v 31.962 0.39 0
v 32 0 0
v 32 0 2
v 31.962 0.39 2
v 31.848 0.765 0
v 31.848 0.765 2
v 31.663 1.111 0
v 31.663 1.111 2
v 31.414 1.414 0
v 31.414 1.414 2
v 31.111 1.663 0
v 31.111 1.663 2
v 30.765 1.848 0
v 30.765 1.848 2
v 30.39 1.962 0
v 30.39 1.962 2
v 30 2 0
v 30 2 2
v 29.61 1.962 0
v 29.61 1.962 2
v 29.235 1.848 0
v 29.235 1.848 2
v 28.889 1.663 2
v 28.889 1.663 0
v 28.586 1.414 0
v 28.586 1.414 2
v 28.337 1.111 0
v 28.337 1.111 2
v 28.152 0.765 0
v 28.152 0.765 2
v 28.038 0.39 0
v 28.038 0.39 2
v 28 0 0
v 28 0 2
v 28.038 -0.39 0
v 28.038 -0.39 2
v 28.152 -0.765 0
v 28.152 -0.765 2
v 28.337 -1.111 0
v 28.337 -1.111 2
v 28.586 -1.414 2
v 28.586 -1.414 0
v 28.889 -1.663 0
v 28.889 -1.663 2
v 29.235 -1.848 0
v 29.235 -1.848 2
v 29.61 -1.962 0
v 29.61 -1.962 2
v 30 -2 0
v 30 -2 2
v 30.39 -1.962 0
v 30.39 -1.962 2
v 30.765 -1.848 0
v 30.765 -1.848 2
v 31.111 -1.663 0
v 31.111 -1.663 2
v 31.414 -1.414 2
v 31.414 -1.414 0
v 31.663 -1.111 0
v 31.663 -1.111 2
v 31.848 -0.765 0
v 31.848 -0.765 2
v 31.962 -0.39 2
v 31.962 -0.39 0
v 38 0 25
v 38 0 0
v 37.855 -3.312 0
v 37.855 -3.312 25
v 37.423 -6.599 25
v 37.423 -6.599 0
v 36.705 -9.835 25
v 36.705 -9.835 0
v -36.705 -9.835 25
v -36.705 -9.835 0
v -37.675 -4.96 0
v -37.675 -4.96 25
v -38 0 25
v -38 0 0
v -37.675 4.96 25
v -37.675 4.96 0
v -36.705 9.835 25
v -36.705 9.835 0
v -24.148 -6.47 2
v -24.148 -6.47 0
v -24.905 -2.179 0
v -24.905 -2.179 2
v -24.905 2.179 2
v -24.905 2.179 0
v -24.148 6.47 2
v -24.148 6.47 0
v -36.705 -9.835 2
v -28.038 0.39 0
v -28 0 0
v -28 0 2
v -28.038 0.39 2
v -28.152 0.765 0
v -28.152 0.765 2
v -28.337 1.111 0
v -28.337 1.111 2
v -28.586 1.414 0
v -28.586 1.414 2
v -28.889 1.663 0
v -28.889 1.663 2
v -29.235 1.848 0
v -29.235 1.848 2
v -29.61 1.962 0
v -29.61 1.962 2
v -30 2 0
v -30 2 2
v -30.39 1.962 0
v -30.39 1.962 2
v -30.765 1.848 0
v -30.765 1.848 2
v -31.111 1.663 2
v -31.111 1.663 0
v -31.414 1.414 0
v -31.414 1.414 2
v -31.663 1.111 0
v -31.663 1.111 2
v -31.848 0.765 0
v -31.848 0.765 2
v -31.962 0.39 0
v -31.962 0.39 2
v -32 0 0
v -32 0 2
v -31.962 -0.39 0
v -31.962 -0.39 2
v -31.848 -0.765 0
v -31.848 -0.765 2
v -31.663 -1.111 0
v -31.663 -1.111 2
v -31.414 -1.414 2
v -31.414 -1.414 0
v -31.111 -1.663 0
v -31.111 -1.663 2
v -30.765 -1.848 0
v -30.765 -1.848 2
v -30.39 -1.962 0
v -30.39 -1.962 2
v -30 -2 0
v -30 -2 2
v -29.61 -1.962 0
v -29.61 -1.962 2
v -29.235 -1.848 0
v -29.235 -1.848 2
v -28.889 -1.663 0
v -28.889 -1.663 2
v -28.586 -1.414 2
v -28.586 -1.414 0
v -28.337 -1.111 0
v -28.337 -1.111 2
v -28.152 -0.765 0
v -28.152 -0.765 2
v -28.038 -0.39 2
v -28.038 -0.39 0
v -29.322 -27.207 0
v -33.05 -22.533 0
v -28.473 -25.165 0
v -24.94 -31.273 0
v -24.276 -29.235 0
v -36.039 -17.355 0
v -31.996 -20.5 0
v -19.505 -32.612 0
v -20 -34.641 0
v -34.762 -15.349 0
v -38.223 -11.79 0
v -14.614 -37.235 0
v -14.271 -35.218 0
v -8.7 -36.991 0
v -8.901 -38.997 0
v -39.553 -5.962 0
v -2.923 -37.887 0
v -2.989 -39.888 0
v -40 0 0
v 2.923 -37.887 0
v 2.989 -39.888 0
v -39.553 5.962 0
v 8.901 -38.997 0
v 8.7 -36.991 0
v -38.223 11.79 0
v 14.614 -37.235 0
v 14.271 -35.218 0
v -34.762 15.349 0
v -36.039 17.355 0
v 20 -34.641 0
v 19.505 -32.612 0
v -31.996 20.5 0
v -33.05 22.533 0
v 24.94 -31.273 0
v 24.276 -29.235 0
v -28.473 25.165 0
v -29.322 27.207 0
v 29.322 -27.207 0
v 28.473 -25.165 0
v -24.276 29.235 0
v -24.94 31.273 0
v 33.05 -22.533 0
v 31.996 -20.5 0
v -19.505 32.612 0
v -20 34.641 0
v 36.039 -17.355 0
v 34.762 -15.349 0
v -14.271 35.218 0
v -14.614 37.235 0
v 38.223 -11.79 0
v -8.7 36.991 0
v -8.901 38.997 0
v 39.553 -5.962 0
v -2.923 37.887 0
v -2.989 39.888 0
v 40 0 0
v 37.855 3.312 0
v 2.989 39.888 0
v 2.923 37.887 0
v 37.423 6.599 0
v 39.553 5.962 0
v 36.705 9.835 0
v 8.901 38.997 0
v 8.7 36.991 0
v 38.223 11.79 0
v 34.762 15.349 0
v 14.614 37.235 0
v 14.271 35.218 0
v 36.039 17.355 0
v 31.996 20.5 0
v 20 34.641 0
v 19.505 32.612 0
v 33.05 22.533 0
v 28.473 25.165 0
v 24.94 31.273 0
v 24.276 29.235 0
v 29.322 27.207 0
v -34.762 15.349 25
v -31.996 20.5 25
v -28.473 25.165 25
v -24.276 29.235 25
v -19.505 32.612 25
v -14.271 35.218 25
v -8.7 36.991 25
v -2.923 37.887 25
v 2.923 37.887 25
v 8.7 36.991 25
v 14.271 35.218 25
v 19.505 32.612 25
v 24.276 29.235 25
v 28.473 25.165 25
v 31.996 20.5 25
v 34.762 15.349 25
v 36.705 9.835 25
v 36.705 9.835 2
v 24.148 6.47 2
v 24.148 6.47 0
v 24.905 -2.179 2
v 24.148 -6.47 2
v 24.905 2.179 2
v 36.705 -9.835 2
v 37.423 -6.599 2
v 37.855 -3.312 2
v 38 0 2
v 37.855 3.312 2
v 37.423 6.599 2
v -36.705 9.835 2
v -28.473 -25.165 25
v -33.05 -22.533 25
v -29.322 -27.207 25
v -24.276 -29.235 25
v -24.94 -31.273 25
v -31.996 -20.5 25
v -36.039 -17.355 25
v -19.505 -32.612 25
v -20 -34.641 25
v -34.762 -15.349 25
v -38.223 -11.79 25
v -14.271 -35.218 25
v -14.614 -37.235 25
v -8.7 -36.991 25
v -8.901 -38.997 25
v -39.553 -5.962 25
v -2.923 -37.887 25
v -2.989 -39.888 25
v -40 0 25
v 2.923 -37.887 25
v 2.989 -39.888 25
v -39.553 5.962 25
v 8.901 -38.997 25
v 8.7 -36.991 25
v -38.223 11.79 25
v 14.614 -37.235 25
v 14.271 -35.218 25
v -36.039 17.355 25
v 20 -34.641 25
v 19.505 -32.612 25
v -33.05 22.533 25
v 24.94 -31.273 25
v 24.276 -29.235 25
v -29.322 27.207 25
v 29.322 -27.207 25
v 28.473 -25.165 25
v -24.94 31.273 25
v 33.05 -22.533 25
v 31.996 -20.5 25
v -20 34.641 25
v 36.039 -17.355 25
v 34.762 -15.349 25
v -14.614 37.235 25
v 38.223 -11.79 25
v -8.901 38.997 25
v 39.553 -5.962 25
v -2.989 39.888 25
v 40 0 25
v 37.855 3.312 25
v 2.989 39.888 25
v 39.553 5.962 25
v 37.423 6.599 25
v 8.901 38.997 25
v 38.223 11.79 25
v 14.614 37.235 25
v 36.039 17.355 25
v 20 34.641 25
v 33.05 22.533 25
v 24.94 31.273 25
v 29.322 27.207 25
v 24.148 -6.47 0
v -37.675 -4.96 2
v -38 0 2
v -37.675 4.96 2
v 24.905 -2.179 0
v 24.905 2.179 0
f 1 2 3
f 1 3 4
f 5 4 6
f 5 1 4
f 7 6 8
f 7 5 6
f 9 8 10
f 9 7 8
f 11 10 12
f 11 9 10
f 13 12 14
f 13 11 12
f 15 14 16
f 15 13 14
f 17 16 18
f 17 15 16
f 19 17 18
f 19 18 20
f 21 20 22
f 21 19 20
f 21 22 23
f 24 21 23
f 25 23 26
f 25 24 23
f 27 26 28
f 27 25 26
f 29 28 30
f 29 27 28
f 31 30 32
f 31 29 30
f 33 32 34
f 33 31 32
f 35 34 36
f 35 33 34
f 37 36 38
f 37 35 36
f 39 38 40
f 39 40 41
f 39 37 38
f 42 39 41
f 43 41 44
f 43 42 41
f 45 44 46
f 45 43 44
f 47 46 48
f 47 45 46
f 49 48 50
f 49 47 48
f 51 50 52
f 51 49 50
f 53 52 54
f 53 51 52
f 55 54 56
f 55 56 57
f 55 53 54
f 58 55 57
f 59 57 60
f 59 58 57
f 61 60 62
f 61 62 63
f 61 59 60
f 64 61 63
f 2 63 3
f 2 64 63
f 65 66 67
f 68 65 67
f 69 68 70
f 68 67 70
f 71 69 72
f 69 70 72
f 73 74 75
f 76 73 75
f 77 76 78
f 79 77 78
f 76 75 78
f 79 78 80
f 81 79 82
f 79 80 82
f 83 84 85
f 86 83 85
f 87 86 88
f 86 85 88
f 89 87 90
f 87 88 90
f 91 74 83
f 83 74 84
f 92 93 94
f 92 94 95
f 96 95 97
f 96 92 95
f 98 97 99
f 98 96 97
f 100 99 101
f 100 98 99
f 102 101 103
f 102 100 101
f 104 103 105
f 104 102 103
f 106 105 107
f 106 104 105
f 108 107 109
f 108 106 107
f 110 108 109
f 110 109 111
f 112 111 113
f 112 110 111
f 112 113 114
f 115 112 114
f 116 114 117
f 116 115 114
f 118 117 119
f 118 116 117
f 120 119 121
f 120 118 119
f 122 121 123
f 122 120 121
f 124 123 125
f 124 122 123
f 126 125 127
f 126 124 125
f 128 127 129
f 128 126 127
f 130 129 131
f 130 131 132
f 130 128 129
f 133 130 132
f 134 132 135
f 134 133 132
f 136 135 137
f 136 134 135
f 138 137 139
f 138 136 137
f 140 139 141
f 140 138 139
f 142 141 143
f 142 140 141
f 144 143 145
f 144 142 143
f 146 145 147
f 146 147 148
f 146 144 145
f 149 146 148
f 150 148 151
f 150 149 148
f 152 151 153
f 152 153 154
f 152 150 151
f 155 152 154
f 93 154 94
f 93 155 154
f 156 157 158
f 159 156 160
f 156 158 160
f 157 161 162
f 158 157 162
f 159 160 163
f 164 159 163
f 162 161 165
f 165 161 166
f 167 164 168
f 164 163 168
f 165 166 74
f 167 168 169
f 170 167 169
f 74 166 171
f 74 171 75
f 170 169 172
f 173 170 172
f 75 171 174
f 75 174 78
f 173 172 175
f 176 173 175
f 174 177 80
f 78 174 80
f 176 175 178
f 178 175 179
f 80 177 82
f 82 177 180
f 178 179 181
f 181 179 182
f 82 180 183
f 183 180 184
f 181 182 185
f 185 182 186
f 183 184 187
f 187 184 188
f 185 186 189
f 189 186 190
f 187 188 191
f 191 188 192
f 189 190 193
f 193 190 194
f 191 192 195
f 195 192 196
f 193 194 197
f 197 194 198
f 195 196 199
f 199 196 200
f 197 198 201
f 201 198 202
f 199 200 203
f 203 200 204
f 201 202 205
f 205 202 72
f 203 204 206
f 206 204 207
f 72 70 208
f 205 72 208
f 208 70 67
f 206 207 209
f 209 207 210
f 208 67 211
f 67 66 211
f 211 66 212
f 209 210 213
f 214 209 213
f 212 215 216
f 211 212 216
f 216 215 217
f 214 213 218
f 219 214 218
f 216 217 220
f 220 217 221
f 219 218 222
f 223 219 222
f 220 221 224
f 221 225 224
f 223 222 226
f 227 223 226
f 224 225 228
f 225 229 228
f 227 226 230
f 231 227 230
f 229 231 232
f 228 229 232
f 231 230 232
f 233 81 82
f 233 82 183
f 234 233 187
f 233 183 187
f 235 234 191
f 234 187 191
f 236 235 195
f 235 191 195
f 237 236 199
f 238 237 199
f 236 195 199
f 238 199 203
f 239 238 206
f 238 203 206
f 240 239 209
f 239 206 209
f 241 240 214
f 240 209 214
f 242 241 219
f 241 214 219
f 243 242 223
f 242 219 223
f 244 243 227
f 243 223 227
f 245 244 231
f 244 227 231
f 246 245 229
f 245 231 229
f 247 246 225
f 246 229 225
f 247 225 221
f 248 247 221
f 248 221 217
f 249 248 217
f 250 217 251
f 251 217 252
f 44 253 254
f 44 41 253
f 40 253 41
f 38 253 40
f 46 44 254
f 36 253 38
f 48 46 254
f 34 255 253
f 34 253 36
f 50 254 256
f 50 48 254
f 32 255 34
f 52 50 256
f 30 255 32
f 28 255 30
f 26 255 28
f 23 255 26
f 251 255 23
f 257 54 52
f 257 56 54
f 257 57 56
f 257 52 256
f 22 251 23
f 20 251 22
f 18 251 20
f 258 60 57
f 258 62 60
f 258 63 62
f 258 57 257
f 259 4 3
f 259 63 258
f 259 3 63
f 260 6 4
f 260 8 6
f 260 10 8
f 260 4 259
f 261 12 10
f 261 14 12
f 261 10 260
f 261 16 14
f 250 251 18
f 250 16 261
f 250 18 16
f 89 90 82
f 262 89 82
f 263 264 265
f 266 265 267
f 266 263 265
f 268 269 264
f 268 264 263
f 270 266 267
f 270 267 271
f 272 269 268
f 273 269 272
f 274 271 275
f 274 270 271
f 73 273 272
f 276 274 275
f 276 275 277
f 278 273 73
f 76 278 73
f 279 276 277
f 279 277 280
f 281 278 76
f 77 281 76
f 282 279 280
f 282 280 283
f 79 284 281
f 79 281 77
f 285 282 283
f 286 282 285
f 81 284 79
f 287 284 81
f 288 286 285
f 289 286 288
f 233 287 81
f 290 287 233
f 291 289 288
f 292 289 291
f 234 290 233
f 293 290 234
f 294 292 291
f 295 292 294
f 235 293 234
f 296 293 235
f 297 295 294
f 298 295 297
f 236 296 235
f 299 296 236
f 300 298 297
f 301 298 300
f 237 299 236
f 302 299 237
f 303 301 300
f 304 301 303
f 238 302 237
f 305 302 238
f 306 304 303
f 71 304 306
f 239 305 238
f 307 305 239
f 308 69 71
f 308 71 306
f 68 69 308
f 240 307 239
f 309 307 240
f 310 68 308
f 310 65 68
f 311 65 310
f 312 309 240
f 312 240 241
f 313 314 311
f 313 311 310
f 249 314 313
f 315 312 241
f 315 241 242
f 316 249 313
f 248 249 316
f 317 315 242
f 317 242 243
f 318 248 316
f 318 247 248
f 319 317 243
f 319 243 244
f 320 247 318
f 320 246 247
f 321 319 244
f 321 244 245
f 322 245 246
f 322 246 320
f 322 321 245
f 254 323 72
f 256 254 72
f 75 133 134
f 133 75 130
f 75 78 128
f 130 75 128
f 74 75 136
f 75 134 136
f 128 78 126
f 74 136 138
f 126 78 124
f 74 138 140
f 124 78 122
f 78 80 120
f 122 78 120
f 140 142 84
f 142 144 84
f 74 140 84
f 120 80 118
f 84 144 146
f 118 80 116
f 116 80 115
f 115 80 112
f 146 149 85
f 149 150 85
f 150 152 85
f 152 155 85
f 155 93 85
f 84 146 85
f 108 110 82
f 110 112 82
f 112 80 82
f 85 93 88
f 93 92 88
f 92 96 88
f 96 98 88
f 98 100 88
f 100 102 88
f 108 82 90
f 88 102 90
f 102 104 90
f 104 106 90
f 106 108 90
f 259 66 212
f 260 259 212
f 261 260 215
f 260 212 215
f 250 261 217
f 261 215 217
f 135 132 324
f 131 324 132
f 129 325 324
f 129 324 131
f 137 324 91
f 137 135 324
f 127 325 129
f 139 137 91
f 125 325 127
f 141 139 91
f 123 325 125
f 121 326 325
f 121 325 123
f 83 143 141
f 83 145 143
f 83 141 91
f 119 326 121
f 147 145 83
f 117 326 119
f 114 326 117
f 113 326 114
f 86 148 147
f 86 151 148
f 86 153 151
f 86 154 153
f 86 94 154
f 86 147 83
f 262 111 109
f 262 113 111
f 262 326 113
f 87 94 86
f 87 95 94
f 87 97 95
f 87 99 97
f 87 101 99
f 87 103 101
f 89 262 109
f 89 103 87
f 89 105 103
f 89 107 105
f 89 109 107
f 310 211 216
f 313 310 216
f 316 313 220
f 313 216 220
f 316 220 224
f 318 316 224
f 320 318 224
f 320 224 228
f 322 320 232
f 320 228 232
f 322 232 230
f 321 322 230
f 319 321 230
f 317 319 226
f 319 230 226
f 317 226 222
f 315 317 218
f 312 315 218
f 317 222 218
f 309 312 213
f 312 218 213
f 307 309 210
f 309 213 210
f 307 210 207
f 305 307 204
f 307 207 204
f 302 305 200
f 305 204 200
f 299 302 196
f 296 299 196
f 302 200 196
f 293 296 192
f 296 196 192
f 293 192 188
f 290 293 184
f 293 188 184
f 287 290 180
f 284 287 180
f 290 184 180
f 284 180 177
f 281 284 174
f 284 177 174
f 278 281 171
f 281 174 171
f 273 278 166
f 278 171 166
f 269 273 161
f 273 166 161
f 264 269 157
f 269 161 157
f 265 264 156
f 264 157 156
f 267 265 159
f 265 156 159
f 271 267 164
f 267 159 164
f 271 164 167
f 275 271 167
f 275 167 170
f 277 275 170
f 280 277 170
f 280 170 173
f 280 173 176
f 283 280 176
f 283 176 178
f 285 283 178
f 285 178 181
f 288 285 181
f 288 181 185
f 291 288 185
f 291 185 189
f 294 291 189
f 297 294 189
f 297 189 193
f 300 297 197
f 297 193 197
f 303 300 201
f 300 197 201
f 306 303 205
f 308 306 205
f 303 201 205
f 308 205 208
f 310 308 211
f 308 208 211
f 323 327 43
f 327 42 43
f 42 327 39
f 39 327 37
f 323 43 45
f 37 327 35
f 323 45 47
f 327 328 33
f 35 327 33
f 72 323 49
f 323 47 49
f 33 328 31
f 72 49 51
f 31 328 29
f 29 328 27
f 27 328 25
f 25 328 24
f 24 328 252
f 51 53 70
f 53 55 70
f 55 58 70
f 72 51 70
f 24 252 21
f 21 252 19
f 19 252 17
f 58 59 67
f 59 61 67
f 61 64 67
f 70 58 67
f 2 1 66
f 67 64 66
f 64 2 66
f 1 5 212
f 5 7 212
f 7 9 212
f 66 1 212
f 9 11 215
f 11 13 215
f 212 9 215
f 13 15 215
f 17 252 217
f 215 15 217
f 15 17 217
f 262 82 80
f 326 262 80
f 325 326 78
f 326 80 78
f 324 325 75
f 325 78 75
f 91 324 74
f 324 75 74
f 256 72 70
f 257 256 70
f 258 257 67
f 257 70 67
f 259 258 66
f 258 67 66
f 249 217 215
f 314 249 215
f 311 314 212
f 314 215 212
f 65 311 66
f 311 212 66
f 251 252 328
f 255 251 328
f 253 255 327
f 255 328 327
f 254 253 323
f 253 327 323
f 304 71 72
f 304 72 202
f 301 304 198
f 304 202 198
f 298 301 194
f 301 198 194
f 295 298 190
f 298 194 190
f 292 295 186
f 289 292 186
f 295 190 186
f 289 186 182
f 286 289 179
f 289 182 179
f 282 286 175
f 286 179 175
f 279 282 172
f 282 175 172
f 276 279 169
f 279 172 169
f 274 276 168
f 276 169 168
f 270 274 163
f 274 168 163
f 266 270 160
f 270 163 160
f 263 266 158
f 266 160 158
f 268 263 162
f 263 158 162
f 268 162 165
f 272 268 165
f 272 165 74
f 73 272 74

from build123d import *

# Parameters (mm, degrees)
F0_R     = 40
F1_DEPTH = 25
F0_R_2   = 2
F2_DEPTH = 2
F3_DEPTH = 2


with BuildPart() as f1:
    # F0 (on Top) → F1 (new body)
    with BuildSketch(Plane.XY):
        Circle(F0_R)
        with BuildLine():
            ThreePointArc((36.705181, 9.835124), (37.674905, 4.959995), (38, 0))
            ThreePointArc((38, 0), (37.674905, -4.959995), (36.705181, -9.835124))
            ThreePointArc((36.705181, -9.835124), (0, -38), (-36.705181, -9.835124))
            ThreePointArc((-36.705181, -9.835124), (-38, 0), (-36.705181, 9.835124))
            ThreePointArc((-36.705181, 9.835124), (0, 38), (36.705181, 9.835124))
        make_face(mode=Mode.SUBTRACT)
    extrude(amount=F1_DEPTH)


with BuildPart() as f2:
    # F0 (on Top) → F2 (new body)
    with BuildSketch(Plane.XY):
        with BuildLine():
            Line((-24.148146, 6.470476), (-36.705181, 9.835124))
            ThreePointArc((-36.705181, 9.835124), (-38, 0), (-36.705181, -9.835124))
            Line((-36.705181, -9.835124), (-24.148146, -6.470476))
            ThreePointArc((-24.148146, -6.470476), (-25, 0), (-24.148146, 6.470476))
        make_face()
        with Locations((-30, 0)):
            Circle(F0_R_2, mode=Mode.SUBTRACT)
    extrude(amount=F2_DEPTH)


with BuildPart() as f3:
    # F0 (on Top) → F3 (new body)
    with BuildSketch(Plane.XY):
        with BuildLine():
            ThreePointArc((36.705181, -9.835124), (37.674905, -4.959995), (38, 0))
            ThreePointArc((38, 0), (37.674905, 4.959995), (36.705181, 9.835124))
            Line((36.705181, 9.835124), (24.148146, 6.470476))
            ThreePointArc((24.148146, 6.470476), (25, 0), (24.148146, -6.470476))
            Line((24.148146, -6.470476), (36.705181, -9.835124))
        make_face()
        with Locations((30, 0)):
            Circle(F0_R_2, mode=Mode.SUBTRACT)
    extrude(amount=F3_DEPTH)


solid = Compound([f1.part, f2.part, f3.part])
